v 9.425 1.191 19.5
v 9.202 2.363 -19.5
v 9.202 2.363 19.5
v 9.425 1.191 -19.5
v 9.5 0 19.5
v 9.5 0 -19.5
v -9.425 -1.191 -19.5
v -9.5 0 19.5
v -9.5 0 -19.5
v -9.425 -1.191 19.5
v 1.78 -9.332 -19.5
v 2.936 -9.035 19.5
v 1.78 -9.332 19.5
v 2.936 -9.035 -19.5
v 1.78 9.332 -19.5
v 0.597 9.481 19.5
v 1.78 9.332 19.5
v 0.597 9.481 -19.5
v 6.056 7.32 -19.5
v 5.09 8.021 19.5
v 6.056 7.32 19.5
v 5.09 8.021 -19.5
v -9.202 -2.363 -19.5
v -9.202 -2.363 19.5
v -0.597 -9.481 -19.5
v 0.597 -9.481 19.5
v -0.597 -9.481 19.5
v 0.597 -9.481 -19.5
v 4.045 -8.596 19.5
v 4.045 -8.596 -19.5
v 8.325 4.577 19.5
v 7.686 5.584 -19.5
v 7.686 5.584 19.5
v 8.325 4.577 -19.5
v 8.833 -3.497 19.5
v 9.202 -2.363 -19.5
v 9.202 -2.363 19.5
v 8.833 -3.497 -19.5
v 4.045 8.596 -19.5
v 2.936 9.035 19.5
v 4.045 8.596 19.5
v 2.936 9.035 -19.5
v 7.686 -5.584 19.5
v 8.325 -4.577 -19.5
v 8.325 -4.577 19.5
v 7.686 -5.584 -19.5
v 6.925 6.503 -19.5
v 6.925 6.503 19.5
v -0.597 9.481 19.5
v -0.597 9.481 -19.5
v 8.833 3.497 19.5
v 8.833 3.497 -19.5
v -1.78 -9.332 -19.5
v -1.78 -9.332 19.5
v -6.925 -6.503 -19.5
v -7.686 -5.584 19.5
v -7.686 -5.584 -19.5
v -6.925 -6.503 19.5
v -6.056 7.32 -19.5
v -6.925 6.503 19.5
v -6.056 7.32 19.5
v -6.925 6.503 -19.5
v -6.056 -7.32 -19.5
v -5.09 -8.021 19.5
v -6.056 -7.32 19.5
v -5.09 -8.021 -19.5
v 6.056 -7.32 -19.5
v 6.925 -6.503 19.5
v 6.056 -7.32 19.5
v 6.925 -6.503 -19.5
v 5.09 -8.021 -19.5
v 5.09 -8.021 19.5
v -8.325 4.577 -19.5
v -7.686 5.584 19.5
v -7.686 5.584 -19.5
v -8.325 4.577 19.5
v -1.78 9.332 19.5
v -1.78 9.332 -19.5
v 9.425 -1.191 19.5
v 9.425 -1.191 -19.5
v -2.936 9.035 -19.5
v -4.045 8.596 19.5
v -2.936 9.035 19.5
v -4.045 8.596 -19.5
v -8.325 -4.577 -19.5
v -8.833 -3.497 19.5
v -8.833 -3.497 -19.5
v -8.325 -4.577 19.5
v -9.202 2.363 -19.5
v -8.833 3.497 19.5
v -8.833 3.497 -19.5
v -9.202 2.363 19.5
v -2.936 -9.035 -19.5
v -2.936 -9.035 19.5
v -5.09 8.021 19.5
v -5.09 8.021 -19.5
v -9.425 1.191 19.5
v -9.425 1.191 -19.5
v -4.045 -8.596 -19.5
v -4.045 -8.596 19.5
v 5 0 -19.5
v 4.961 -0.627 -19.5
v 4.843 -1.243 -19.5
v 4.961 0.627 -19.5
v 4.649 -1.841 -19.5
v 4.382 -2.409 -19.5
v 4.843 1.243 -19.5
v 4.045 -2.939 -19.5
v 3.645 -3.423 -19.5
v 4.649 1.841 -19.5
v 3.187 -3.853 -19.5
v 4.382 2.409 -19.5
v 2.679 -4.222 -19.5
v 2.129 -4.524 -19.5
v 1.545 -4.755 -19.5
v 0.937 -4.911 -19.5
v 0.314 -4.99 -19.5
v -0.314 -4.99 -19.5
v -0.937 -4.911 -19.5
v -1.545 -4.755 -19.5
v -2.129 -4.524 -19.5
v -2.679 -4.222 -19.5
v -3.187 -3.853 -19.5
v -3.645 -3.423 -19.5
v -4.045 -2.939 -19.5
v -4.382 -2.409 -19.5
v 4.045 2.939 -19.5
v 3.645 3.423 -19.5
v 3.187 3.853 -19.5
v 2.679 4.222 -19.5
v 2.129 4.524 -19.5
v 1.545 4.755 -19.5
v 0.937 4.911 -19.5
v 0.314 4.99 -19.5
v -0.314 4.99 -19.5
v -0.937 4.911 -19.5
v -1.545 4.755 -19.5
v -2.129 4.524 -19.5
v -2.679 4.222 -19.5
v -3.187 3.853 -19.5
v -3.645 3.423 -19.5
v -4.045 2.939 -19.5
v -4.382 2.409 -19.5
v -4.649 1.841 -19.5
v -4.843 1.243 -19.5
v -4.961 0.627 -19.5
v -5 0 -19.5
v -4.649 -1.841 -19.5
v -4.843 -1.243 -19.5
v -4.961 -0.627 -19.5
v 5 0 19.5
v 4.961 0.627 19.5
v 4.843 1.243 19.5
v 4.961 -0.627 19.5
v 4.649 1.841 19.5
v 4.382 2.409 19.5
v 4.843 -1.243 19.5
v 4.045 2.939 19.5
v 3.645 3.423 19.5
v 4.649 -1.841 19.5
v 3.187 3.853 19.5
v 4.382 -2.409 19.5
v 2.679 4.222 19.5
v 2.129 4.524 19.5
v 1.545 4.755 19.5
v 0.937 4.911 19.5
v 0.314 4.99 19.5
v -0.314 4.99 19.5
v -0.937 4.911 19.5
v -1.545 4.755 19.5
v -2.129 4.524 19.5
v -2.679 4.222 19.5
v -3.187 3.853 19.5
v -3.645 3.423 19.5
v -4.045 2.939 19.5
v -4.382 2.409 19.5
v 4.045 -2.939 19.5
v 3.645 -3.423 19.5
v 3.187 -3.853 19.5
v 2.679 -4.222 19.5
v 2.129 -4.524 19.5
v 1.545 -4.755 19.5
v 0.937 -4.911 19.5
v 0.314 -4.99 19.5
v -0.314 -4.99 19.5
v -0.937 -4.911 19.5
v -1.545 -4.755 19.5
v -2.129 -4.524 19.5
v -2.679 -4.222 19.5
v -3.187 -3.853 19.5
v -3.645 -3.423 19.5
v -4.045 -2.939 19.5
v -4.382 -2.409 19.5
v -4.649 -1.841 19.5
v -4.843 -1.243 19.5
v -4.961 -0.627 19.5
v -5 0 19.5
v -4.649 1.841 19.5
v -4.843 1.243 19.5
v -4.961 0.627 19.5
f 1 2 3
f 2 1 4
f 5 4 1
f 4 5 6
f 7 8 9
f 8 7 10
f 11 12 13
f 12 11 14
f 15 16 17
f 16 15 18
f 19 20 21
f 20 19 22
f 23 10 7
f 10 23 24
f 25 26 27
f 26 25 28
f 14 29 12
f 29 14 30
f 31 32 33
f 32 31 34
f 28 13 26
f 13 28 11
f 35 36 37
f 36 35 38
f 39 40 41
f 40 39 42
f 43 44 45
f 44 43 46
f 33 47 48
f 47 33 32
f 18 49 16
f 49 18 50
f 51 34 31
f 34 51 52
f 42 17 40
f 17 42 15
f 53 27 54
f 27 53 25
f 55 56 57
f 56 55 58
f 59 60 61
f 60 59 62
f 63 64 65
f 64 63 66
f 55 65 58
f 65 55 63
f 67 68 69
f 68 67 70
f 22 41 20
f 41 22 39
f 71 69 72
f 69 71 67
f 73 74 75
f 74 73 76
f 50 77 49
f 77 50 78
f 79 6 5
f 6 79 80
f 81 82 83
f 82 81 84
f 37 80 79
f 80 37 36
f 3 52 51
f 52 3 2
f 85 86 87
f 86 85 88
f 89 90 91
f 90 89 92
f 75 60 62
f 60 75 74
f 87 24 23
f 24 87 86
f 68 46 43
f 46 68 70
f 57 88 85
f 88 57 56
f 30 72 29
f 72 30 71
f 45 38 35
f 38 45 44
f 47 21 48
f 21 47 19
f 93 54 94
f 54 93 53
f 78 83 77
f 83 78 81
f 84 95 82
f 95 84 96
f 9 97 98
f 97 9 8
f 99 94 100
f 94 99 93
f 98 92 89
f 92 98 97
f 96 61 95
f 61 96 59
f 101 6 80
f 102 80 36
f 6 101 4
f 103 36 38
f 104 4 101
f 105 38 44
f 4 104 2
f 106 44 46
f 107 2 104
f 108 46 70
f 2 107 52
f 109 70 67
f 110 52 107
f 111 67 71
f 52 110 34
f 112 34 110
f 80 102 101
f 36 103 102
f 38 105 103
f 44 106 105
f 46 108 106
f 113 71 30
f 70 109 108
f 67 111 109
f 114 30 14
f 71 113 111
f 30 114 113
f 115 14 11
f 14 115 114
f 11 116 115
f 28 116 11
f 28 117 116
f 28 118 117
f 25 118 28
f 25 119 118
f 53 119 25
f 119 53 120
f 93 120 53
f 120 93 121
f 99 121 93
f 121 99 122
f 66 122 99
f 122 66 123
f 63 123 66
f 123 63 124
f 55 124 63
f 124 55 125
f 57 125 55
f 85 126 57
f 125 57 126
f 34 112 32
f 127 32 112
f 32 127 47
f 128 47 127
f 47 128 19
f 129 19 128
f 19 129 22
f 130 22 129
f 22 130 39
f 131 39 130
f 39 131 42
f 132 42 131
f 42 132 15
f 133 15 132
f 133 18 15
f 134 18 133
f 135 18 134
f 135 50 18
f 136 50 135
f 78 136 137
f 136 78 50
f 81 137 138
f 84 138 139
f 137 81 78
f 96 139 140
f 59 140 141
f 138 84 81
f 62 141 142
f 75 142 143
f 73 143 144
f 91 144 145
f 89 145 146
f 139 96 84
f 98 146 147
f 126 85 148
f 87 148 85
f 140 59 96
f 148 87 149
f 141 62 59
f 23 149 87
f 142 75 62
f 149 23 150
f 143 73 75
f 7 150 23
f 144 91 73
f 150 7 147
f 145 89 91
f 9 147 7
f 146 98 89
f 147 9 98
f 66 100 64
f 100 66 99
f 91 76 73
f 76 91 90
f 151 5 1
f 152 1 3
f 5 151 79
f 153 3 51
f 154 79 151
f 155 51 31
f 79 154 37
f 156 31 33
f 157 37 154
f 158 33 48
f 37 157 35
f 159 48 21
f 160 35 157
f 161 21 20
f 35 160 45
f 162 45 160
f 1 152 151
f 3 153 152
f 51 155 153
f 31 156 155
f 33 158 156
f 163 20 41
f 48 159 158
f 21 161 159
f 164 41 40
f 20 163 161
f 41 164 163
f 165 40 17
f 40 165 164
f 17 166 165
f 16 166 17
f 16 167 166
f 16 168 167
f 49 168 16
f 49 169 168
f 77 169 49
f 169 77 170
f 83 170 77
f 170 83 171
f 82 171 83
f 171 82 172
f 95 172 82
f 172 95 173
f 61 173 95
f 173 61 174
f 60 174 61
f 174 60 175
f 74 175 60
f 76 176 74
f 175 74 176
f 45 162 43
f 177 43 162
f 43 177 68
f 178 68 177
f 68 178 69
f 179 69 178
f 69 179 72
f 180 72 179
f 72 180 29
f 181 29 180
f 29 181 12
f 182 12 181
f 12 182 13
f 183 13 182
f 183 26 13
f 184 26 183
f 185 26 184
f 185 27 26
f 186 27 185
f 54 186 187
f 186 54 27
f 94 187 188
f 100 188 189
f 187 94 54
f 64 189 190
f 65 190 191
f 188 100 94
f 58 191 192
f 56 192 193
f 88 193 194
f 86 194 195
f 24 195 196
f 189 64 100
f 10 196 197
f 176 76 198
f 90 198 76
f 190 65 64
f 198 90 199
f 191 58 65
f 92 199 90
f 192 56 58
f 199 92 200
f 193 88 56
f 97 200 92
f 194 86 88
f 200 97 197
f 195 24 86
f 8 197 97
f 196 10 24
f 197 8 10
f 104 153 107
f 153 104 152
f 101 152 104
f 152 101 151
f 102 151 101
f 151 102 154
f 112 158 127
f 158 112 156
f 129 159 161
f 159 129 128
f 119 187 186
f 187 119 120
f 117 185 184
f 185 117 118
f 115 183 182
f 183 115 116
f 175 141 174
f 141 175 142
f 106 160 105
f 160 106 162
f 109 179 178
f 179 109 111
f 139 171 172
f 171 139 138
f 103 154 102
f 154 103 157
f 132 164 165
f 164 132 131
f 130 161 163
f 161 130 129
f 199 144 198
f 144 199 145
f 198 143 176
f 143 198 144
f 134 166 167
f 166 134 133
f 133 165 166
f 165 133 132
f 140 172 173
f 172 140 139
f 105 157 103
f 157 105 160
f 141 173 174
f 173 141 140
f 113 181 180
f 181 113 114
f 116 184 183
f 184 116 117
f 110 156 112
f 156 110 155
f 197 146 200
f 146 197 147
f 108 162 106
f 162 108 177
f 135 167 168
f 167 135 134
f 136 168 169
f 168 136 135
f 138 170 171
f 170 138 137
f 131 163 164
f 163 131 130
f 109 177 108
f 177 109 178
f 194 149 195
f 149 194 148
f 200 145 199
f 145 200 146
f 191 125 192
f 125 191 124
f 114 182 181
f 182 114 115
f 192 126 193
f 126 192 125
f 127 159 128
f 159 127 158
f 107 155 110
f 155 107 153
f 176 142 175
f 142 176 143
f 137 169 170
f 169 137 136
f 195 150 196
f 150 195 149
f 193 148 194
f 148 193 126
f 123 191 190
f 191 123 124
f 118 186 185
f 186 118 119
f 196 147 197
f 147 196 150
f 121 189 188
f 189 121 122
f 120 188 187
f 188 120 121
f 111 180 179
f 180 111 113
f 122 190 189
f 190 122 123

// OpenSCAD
$fn = 50;


difference() {
	union() {
		translate(v = [0, 0, -19.5000000000]) {
			cylinder(h = 39, r = 9.5000000000);
		}
	}
	union() {
		translate(v = [0, 0, -100.0000000000]) {
			cylinder(h = 200, r = 5.0000000000);
		}
	}
}
